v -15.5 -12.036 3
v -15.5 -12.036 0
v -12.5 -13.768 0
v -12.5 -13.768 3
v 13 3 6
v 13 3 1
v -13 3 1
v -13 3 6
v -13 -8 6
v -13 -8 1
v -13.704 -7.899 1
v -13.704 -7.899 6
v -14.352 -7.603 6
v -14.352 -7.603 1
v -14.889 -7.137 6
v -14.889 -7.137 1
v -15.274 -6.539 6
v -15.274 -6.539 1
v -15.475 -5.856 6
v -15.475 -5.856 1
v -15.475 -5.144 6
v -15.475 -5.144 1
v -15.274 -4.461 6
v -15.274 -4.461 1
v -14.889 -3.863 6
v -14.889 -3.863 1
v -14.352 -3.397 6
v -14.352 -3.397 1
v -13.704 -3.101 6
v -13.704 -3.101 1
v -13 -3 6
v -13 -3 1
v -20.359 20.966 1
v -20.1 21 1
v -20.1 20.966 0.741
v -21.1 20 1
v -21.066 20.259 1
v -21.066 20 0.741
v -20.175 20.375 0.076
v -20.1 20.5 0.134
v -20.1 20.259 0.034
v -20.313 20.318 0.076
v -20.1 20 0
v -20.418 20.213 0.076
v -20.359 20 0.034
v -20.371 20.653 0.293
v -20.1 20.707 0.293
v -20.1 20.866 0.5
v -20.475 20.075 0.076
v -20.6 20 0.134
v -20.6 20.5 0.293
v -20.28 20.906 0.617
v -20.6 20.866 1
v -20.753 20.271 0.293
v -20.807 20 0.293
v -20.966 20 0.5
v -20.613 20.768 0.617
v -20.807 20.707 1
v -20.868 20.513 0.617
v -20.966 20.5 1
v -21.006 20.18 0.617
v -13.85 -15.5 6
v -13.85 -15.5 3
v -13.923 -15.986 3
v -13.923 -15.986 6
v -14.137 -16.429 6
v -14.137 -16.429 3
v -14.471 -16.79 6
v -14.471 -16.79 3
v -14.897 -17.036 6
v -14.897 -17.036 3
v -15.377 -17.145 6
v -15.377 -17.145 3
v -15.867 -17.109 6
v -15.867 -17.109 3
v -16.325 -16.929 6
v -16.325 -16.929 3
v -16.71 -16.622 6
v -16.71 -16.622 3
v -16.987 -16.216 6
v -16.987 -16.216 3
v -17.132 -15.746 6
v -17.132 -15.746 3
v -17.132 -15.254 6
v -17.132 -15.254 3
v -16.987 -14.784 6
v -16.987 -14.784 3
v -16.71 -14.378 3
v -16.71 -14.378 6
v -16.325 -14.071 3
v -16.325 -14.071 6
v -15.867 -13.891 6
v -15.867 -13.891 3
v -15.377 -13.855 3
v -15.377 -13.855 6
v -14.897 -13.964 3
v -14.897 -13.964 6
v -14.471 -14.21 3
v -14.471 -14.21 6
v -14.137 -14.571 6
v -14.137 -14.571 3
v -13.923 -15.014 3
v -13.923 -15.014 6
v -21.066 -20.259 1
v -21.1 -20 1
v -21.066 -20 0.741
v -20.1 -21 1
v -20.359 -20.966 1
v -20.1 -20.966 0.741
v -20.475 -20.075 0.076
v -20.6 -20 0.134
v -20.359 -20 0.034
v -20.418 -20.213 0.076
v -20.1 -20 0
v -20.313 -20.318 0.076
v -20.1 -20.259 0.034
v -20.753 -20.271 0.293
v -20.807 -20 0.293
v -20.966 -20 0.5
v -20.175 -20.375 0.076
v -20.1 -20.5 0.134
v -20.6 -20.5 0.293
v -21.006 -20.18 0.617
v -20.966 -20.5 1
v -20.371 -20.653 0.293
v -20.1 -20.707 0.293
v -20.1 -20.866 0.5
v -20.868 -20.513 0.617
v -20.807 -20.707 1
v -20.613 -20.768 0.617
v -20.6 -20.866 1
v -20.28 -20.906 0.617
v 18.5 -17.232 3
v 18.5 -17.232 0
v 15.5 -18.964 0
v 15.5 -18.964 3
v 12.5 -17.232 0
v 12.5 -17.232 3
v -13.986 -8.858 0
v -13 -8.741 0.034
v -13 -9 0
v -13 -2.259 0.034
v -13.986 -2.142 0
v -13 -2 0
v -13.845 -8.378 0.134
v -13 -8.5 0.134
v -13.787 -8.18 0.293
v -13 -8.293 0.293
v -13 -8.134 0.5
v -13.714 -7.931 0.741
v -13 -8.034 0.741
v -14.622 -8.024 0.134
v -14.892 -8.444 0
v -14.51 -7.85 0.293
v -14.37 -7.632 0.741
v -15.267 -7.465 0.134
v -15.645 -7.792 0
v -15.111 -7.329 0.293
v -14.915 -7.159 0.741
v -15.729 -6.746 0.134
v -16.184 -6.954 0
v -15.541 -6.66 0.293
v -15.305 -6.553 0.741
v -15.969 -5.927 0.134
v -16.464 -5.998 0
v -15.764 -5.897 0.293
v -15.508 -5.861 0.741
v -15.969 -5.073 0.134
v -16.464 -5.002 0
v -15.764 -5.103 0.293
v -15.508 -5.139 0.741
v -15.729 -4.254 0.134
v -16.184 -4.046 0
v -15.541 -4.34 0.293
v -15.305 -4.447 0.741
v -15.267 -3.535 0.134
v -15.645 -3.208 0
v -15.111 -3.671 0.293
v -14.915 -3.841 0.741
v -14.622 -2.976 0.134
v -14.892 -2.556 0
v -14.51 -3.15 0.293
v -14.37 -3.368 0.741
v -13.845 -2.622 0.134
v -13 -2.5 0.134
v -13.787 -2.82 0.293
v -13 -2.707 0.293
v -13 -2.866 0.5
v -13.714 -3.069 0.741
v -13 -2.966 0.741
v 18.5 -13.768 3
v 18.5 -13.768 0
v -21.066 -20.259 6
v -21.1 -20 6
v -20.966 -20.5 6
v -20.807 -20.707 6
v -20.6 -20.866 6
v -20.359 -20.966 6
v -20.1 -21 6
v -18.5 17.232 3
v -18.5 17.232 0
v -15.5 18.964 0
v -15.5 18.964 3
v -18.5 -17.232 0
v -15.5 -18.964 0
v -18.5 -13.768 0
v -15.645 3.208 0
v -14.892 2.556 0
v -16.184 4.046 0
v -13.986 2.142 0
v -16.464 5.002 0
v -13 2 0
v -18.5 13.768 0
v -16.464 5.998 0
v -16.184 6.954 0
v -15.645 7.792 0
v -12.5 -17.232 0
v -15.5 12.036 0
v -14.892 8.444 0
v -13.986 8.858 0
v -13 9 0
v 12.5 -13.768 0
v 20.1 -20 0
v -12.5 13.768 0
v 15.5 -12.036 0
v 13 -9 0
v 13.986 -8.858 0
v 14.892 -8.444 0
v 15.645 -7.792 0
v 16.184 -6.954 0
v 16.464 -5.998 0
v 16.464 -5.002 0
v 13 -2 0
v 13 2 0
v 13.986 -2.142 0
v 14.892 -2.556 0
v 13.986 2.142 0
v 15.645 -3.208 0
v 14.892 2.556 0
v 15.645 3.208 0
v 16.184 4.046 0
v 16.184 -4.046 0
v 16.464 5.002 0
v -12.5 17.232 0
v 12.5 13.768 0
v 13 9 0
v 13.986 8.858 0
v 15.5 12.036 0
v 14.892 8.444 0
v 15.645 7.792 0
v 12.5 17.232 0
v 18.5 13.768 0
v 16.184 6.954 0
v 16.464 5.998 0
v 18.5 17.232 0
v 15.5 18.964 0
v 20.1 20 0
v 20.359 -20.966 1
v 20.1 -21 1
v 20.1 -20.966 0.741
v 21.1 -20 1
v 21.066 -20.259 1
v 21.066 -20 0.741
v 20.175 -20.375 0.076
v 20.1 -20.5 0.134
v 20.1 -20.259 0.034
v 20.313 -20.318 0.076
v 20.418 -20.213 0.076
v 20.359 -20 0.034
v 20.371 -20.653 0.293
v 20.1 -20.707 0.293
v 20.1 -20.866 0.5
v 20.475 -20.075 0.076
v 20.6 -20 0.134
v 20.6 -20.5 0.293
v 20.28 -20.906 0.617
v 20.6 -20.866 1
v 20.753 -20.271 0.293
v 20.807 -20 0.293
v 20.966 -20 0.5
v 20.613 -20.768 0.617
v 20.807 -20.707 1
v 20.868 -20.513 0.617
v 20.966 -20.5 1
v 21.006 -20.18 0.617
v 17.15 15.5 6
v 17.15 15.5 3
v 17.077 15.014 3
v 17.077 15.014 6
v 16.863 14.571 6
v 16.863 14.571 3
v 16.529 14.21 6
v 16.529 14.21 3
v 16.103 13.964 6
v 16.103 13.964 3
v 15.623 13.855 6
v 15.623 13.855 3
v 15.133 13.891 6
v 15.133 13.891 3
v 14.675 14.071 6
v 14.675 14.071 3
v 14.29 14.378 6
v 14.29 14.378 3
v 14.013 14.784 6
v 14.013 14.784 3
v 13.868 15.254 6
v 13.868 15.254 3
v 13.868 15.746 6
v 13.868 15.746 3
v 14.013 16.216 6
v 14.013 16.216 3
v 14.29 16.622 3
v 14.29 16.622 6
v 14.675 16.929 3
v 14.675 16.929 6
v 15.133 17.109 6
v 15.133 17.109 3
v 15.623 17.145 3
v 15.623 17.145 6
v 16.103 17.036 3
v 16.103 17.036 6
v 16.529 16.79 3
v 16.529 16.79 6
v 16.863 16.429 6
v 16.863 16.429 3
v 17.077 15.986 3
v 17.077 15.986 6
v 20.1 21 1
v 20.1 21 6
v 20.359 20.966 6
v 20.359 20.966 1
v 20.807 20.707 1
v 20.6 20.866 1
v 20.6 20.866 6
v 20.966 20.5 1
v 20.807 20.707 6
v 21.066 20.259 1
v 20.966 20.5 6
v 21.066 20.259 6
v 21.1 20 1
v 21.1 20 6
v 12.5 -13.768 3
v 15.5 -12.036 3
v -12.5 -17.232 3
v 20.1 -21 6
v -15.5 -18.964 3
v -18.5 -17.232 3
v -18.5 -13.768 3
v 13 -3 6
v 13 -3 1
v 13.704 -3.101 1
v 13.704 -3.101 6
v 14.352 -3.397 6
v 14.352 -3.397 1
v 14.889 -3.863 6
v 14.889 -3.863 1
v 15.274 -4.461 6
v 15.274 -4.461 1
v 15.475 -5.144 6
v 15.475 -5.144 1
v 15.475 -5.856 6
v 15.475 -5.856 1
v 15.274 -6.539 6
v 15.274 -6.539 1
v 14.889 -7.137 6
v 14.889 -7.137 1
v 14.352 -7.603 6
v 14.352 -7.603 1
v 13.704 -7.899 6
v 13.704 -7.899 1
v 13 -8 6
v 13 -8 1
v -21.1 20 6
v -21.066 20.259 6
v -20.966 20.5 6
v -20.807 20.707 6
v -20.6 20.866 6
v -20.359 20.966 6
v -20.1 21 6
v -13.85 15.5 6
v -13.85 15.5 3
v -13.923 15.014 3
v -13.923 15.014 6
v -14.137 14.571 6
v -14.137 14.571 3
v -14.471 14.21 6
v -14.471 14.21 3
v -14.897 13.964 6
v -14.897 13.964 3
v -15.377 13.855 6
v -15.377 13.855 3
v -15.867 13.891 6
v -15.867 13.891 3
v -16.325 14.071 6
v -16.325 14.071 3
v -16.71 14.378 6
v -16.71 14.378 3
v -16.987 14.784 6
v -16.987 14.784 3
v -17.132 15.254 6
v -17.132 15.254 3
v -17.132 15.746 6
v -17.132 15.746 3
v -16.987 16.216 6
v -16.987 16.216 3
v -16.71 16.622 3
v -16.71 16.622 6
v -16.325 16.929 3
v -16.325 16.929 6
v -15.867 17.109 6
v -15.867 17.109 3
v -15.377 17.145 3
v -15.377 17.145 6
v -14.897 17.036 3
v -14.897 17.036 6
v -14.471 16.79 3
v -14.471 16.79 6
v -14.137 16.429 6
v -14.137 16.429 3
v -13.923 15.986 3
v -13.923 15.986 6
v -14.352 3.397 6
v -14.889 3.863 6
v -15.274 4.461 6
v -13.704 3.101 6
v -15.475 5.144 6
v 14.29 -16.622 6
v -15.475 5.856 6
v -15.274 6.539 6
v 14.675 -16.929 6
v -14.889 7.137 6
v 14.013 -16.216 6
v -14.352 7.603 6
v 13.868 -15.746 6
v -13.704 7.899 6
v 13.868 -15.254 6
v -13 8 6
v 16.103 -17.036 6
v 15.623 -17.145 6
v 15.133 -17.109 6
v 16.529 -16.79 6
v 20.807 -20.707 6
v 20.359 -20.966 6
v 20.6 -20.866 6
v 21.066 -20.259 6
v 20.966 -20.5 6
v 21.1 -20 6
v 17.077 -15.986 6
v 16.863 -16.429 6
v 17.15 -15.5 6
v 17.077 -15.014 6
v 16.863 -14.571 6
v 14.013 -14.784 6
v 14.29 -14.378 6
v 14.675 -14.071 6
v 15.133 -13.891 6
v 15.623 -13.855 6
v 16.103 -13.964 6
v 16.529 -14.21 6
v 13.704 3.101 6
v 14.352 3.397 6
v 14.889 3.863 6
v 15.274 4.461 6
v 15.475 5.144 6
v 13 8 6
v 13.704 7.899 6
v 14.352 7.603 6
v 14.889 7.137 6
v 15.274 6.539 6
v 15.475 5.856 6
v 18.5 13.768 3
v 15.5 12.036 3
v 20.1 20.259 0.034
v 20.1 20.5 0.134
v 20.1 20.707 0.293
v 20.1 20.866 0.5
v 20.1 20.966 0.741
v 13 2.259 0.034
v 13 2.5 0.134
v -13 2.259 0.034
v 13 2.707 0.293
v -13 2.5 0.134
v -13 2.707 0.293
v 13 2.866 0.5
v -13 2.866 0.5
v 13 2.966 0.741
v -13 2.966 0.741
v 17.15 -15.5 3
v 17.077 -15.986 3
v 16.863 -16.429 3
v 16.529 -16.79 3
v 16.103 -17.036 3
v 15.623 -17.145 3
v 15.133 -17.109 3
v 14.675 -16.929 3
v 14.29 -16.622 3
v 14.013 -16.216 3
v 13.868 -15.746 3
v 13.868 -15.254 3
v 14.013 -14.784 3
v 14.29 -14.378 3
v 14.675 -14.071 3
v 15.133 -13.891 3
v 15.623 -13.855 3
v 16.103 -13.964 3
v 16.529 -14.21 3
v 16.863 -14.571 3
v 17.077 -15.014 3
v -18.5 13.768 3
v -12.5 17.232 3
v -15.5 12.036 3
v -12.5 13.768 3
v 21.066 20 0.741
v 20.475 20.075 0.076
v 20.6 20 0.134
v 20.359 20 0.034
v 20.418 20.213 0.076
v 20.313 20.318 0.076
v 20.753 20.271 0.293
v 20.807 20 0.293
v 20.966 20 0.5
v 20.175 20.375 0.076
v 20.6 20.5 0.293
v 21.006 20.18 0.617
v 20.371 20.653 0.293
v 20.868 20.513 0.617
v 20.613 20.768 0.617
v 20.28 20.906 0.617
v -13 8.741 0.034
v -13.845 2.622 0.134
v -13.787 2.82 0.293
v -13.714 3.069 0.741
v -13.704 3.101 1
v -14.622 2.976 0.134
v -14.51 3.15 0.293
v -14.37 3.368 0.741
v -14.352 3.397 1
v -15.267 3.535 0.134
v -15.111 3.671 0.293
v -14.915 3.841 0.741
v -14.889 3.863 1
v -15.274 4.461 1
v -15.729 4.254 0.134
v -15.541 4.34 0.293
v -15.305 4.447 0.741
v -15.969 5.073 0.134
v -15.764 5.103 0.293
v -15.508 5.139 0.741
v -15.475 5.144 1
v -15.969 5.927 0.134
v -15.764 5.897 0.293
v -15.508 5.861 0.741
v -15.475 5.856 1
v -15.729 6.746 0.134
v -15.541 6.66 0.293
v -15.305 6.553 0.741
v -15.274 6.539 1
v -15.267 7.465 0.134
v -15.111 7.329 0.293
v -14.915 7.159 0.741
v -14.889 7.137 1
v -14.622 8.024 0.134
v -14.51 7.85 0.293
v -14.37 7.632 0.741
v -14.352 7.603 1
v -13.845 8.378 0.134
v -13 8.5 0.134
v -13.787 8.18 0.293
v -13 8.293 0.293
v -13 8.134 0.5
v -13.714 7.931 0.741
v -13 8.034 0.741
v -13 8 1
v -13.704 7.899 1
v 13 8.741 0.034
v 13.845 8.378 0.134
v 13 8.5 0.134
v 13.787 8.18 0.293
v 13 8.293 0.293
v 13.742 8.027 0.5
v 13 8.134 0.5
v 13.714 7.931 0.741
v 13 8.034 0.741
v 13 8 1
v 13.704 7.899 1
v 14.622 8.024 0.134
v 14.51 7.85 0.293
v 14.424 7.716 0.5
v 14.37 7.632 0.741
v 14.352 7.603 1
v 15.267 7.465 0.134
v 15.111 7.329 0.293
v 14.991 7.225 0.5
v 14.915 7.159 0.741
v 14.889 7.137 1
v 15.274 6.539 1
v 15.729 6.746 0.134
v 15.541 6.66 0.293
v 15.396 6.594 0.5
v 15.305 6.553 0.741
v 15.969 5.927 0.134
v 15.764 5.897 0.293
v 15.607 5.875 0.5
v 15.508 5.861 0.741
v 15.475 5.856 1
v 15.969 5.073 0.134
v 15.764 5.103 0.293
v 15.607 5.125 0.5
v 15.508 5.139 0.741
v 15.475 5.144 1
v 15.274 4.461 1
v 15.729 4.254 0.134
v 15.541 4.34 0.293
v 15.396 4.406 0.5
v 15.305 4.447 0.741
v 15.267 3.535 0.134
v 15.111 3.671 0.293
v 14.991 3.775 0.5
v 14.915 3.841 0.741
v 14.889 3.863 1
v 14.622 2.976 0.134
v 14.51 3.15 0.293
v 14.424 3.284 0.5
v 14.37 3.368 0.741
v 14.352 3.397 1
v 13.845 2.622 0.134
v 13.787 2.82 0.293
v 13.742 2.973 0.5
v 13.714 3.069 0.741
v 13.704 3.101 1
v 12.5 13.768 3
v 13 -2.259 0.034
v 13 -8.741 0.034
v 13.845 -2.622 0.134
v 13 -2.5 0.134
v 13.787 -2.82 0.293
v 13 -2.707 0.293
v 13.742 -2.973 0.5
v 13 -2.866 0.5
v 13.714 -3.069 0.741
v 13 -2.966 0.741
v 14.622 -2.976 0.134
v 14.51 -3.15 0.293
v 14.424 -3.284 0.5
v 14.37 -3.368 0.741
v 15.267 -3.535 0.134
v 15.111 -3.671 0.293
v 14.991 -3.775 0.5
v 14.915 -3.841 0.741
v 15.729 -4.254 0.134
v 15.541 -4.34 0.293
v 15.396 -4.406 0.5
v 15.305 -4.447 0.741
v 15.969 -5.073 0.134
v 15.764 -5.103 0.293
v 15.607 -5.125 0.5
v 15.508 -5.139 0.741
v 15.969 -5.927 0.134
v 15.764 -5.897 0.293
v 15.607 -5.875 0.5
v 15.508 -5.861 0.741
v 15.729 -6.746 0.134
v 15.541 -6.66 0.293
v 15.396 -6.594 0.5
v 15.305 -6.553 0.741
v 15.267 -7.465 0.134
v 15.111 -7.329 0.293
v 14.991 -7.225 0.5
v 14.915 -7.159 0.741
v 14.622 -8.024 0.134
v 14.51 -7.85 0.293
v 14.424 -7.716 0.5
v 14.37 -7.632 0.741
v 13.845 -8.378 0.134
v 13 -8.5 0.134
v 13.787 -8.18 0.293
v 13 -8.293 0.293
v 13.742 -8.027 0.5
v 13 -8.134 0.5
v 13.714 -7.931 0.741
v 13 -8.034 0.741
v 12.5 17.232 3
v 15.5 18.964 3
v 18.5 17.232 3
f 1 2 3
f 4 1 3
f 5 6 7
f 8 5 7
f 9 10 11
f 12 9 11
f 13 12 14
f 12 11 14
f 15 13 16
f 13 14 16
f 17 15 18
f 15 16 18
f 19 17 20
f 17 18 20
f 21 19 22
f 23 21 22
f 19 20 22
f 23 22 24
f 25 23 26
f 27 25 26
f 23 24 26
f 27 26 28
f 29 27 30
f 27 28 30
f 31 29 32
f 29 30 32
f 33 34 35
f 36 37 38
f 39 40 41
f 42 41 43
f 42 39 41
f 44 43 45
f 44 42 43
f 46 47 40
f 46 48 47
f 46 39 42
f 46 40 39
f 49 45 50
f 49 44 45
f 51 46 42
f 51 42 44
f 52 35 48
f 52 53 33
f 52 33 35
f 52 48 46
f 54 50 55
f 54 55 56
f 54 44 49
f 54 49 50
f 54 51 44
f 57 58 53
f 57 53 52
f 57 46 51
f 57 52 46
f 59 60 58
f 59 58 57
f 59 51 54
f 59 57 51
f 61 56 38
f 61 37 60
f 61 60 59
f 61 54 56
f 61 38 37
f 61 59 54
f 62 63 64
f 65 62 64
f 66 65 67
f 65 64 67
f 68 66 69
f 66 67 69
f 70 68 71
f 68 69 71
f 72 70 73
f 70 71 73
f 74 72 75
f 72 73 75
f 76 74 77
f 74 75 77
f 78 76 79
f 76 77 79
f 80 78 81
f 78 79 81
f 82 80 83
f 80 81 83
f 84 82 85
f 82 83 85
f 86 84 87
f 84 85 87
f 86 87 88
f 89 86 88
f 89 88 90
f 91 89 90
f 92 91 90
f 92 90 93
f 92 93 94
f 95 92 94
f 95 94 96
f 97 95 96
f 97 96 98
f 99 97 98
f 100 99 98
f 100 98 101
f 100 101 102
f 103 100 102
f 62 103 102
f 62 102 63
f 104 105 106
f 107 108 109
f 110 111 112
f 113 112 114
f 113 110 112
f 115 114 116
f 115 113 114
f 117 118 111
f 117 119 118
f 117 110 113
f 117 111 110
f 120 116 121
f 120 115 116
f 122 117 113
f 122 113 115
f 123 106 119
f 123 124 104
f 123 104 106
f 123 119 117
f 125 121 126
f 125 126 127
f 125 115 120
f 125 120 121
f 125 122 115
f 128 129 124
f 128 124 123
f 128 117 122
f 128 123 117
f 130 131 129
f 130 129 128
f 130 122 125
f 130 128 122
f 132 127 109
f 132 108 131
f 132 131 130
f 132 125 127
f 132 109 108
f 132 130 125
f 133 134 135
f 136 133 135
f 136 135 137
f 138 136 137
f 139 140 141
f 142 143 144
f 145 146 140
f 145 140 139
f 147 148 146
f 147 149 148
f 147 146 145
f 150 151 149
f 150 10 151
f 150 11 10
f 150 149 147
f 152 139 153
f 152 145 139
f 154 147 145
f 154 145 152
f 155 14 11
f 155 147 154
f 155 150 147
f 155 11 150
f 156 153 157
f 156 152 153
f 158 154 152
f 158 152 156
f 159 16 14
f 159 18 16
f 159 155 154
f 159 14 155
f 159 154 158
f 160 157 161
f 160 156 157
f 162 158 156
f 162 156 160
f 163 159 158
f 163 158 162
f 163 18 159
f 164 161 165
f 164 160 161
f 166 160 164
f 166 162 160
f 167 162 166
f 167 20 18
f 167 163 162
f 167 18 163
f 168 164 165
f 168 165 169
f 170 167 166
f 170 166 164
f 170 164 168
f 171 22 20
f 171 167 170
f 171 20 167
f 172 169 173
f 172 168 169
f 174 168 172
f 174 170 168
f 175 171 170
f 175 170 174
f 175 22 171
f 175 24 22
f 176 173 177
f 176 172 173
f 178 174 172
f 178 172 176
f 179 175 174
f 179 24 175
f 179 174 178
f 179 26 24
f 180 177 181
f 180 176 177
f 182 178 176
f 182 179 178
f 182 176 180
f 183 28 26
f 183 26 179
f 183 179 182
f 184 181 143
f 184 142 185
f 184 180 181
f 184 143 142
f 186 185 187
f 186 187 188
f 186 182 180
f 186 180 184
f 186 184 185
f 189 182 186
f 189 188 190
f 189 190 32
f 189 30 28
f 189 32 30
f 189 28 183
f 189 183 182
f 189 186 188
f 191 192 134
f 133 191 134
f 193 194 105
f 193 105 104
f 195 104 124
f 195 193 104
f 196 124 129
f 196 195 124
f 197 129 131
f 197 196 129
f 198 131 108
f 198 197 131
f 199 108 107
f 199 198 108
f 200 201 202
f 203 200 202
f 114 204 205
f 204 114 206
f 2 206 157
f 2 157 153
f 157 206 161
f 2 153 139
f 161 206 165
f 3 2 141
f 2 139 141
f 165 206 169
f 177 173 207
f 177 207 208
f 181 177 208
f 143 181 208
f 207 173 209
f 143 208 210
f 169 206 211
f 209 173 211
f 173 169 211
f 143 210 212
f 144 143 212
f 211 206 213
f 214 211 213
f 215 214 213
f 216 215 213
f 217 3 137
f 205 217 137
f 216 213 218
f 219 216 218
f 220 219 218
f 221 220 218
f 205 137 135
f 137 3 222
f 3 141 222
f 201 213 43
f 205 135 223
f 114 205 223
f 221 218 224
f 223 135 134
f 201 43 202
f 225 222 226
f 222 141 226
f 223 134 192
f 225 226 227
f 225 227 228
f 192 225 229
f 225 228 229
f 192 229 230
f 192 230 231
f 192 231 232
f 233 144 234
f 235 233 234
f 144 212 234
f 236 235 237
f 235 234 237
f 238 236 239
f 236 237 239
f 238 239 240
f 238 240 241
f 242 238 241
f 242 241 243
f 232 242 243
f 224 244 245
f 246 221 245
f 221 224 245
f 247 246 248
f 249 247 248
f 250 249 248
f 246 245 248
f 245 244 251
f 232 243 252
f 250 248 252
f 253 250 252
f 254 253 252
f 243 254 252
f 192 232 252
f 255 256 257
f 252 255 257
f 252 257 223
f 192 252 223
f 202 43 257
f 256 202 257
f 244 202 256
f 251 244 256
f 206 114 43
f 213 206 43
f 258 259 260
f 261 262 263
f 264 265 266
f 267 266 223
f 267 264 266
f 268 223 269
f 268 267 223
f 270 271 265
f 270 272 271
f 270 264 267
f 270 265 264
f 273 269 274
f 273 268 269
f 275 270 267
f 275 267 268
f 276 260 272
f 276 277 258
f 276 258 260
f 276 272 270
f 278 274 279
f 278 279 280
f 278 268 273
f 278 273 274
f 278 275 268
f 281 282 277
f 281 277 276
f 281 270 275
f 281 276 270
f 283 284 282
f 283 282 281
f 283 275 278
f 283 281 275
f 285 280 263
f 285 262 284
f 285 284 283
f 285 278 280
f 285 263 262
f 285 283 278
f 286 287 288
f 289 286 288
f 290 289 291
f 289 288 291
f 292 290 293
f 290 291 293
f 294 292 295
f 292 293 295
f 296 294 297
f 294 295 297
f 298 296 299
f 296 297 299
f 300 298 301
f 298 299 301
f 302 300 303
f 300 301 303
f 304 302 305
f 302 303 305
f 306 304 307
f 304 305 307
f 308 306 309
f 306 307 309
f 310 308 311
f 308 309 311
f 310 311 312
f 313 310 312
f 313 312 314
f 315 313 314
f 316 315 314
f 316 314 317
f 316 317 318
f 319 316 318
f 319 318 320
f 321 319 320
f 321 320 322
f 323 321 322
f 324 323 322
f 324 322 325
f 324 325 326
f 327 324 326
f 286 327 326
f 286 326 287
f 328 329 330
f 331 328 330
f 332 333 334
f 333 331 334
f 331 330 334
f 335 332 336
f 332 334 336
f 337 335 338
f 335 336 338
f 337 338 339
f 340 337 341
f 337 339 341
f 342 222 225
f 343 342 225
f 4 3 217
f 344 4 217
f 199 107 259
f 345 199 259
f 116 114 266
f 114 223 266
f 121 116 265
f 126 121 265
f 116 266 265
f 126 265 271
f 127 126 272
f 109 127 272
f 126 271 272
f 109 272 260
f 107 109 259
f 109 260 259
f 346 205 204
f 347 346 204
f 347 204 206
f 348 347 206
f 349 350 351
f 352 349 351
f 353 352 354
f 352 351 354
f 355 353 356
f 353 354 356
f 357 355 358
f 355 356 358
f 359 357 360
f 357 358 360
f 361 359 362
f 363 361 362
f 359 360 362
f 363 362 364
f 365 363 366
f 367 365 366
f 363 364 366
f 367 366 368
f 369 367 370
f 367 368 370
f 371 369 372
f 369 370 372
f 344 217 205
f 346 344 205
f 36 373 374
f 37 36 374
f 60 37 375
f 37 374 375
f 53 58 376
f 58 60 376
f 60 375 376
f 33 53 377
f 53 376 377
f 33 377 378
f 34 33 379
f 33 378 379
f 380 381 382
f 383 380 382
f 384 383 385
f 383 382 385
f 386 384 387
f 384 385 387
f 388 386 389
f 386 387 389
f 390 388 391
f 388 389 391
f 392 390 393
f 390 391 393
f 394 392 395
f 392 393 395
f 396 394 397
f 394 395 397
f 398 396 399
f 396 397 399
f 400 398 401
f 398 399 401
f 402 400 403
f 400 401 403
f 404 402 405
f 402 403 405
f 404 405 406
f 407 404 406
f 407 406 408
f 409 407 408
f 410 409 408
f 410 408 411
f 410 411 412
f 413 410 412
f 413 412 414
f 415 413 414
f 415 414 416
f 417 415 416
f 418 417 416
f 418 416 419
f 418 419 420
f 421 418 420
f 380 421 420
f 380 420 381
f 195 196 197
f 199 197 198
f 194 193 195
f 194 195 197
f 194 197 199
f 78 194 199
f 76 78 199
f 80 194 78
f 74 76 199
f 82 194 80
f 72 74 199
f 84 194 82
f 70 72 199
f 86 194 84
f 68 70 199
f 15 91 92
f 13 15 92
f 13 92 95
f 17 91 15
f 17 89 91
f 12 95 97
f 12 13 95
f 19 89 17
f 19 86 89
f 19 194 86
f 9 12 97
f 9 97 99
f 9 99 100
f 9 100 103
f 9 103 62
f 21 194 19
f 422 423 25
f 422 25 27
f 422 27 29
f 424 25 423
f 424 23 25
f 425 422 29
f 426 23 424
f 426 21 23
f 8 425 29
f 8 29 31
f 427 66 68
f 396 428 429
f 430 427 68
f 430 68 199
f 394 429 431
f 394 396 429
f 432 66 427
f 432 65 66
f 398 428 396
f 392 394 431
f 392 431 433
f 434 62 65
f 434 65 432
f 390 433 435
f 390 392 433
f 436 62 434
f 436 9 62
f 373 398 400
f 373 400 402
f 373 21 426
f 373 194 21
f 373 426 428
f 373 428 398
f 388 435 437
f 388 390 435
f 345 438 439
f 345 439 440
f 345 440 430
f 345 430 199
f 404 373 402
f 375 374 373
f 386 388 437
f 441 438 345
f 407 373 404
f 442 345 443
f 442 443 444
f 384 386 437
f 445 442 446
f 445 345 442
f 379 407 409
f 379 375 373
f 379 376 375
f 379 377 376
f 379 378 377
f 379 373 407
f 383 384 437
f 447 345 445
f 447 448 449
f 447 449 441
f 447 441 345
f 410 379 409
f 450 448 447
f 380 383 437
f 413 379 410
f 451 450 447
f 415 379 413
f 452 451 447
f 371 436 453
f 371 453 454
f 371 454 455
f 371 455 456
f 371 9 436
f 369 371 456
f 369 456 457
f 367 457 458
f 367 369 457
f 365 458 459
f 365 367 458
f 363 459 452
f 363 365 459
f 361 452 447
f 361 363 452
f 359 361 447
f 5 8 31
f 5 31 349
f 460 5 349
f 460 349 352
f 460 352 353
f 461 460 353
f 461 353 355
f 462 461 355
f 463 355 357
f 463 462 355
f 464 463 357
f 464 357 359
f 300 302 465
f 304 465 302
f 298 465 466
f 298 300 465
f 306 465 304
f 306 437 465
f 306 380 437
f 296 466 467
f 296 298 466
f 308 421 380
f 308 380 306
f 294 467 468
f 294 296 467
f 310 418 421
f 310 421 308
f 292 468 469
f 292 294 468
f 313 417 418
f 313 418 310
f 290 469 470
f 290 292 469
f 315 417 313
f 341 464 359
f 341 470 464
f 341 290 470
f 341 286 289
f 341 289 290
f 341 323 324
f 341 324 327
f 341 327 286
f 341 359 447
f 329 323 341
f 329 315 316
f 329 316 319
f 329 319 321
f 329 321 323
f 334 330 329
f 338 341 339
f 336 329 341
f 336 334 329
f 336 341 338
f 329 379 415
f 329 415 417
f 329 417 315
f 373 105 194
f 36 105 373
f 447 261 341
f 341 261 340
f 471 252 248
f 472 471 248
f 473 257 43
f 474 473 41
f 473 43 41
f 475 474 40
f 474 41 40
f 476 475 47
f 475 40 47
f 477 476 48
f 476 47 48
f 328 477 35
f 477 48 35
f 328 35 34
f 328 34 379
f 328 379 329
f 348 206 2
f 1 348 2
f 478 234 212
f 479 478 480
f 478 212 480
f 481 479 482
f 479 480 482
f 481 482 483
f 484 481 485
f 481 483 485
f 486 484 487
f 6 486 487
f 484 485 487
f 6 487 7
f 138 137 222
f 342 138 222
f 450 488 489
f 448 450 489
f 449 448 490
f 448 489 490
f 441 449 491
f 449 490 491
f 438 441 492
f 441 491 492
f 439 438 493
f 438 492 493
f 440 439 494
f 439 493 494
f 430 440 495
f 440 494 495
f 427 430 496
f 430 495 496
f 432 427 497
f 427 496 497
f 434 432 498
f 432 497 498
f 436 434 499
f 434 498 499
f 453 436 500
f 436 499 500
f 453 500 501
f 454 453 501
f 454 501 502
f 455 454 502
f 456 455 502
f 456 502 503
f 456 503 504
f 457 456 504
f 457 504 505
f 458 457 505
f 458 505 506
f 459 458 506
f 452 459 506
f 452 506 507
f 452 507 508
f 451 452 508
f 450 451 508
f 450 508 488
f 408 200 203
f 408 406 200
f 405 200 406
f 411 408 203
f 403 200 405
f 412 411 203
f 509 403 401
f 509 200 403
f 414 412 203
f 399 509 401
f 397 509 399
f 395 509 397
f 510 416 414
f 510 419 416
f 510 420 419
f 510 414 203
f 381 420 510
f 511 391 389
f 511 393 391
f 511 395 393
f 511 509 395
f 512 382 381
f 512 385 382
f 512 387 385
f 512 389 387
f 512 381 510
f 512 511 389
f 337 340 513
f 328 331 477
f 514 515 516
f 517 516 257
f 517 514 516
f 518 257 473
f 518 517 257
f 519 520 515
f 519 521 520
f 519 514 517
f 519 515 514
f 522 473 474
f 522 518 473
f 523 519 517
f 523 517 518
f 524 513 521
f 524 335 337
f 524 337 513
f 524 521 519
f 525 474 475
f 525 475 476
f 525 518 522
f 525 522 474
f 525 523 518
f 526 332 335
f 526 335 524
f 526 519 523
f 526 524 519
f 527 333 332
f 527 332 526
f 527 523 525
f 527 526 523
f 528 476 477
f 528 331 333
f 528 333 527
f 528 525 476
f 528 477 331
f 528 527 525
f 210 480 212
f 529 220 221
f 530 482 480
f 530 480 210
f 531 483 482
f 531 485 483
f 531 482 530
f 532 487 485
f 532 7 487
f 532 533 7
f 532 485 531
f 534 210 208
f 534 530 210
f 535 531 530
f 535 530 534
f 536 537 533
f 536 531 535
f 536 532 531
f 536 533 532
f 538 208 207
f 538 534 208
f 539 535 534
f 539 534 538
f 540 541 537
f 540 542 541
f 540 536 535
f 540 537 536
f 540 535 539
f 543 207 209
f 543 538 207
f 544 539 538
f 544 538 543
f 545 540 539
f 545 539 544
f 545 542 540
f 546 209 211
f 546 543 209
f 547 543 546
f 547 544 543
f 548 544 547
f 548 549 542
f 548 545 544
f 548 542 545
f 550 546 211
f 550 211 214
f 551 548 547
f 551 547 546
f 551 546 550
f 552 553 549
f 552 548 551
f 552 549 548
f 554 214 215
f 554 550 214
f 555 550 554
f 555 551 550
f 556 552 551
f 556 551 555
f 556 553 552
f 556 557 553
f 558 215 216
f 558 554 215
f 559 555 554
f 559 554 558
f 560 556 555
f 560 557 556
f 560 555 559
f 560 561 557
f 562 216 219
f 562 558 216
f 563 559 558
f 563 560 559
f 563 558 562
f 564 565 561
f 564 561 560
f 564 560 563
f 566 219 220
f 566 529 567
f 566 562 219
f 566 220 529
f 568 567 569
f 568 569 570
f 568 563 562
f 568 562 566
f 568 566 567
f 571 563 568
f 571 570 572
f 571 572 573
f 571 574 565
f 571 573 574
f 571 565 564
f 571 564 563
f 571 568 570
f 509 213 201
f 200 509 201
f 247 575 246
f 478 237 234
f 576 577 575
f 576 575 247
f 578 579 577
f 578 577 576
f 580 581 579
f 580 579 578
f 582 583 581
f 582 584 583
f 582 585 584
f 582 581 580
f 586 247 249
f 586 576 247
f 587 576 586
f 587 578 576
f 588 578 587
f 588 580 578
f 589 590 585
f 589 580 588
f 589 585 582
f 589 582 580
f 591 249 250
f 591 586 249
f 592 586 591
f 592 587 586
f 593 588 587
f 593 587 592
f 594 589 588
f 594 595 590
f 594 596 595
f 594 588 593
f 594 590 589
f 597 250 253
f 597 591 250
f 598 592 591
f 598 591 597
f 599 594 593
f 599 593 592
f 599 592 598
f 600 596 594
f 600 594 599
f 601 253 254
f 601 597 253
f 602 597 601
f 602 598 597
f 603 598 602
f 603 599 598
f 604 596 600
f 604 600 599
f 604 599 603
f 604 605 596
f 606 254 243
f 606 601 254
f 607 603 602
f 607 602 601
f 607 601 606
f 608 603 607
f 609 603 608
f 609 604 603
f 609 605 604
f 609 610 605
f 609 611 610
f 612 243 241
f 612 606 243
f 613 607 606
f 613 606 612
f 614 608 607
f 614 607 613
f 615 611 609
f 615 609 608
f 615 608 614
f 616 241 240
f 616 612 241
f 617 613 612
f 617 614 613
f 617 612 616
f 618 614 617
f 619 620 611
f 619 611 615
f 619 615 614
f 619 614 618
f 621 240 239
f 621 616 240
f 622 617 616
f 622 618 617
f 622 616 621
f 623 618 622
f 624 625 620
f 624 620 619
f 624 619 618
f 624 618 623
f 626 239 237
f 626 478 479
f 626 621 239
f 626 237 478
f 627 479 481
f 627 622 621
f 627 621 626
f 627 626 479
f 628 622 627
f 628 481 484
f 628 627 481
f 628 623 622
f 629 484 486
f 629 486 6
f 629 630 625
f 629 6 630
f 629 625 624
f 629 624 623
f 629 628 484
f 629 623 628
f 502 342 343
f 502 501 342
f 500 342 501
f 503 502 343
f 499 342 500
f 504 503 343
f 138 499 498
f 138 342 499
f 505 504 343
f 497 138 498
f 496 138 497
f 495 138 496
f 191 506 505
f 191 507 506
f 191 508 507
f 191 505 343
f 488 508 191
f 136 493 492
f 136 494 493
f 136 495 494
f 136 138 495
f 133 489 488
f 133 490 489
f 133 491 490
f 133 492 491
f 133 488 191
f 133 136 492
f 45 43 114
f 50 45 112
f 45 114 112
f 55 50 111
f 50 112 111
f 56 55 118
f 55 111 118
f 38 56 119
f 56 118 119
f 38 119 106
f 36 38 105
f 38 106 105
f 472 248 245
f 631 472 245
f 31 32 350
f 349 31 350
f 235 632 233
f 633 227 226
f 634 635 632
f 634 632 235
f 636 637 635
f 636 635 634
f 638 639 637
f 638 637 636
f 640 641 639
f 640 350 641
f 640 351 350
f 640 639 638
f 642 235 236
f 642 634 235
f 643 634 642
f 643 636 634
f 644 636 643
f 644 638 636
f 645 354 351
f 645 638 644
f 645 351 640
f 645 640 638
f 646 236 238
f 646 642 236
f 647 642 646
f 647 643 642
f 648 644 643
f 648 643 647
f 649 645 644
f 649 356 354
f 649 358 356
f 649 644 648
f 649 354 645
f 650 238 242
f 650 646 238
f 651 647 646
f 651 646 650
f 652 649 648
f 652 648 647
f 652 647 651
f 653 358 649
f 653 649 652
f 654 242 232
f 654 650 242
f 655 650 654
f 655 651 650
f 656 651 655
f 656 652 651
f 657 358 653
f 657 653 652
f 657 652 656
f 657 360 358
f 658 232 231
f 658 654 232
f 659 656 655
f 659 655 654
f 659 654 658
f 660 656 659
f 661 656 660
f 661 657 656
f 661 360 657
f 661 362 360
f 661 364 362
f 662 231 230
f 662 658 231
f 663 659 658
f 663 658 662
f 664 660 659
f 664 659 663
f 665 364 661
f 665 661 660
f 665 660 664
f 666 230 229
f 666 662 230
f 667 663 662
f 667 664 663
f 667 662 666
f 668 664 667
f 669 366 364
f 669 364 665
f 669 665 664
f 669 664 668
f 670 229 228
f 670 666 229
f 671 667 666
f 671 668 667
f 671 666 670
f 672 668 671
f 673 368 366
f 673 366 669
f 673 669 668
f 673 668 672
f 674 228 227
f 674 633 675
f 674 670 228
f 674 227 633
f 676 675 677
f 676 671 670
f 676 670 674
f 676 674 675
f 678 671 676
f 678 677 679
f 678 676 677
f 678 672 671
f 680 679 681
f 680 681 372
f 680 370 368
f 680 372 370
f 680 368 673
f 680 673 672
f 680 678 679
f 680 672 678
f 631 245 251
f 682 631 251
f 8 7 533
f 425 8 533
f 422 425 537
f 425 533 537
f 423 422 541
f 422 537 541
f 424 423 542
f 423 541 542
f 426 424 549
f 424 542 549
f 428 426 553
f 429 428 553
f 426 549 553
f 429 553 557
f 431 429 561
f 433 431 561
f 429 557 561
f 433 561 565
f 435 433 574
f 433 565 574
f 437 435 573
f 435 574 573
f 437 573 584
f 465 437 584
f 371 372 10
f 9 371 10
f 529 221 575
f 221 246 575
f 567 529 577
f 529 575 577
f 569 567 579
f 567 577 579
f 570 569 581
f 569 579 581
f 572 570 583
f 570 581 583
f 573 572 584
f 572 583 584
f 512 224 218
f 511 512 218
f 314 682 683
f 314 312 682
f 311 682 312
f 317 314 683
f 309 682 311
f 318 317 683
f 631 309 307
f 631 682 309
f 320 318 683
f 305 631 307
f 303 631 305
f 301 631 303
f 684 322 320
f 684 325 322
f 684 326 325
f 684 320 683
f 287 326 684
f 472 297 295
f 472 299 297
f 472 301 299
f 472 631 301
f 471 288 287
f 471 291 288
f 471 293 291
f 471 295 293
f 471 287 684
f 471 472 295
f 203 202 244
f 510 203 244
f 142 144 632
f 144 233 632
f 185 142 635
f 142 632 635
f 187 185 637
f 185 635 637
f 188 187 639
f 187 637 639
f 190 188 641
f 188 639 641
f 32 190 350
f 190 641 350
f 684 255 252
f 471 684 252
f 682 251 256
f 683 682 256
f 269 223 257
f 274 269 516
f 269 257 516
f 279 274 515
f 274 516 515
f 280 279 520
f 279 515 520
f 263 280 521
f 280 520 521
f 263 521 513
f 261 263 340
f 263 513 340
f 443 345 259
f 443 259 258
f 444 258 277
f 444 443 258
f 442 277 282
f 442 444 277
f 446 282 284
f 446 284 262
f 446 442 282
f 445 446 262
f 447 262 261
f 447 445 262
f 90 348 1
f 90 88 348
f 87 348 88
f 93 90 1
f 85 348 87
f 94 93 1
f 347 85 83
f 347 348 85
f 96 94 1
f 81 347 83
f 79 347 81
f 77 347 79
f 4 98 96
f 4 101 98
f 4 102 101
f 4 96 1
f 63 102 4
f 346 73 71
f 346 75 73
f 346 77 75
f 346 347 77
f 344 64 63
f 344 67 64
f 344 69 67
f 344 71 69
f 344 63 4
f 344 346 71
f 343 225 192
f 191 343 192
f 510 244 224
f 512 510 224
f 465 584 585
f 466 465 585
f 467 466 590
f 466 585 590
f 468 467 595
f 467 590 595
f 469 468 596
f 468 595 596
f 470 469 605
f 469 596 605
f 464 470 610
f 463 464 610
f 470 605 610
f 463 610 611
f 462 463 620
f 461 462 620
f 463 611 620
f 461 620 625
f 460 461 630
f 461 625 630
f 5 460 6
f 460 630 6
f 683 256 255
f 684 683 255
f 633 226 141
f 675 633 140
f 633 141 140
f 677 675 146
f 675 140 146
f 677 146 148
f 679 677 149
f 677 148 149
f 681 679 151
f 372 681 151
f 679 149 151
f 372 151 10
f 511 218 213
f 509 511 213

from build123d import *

# Parameters (mm, degrees)
F0_W     = 42.2
F0_H     = 42
F1_DEPTH = 6
F3_R     = 1
F4_R     = 1
F5_DEPTH = 3
F6_R     = 1.65
F7_DEPTH = 6.001


with BuildPart() as f1:
    # F0 (on Top) → F1 (new body)
    with BuildSketch(Plane.XY):
        Rectangle(F0_W, F0_H)
        with BuildLine():
            Line((13, -8), (-13, -8))
            ThreePointArc((-13, -8), (-15.5, -5.5), (-13, -3))
            Line((-13, -3), (13, -3))
            ThreePointArc((13, -3), (15.5, -5.5), (13, -8))
        make_face(mode=Mode.SUBTRACT)
        with BuildLine():
            Line((13, 3), (-13, 3))
            ThreePointArc((-13, 3), (-15.5, 5.5), (-13, 8))
            Line((-13, 8), (13, 8))
            ThreePointArc((13, 8), (15.5, 5.5), (13, 3))
        make_face(mode=Mode.SUBTRACT)
    extrude(amount=F1_DEPTH)

    # F3
    f3_edges = [f1.edges().sort_by_distance(p)[0] for p in [
        (-21.1, -21, 3),
        (21.1, -21, 3),
        (-21.1, 21, 3),
        (21.1, 21, 3),
    ]]
    fillet(f3_edges, radius=F3_R)

    # F4
    f4_edges = [f1.edges().sort_by_distance(p)[0] for p in [
        (0, -21, 0),
        (0, -3, 0),
        (0, 8, 0),
    ]]
    fillet(f4_edges, radius=F4_R)

    # F2 (on face) → F5 (cut)
    with BuildSketch(Plane(origin=(0, 0, 0), x_dir=(1, 0, 0), z_dir=(0, 0, -1))):
        Polygon((-12.5, 13.767949), (-12.5, 17.232051), (-15.5, 18.964102), (-18.5, 17.232051), (-18.5, 13.767949), (-15.5, 12.035898), align=None)
        Polygon((12.5, 17.232051), (12.5, 13.767949), (15.5, 12.035898), (18.5, 13.767949), (18.5, 17.232051), (15.5, 18.964102), align=None)
        Polygon((12.5, -13.767949), (12.5, -17.232051), (15.5, -18.964102), (18.5, -17.232051), (18.5, -13.767949), (15.5, -12.035898), align=None)
        Polygon((-12.5, -17.232051), (-12.5, -13.767949), (-15.5, -12.035898), (-18.5, -13.767949), (-18.5, -17.232051), (-15.5, -18.964102), align=None)
    extrude(amount=-F5_DEPTH, mode=Mode.SUBTRACT)

    # F6 (on face) → F7 (cut, through all)
    with BuildSketch(Plane(origin=(0, 0, 0), x_dir=(1, 0, 0), z_dir=(0, 0, -1))):
        with Locations((-15.5, 15.5)):
            Circle(F6_R)
        with Locations((15.5, 15.5)):
            Circle(F6_R)
        with Locations((15.5, -15.5)):
            Circle(F6_R)
        with Locations((-15.5, -15.5)):
            Circle(F6_R)
    extrude(amount=-F7_DEPTH, mode=Mode.SUBTRACT)


solid = f1.part
